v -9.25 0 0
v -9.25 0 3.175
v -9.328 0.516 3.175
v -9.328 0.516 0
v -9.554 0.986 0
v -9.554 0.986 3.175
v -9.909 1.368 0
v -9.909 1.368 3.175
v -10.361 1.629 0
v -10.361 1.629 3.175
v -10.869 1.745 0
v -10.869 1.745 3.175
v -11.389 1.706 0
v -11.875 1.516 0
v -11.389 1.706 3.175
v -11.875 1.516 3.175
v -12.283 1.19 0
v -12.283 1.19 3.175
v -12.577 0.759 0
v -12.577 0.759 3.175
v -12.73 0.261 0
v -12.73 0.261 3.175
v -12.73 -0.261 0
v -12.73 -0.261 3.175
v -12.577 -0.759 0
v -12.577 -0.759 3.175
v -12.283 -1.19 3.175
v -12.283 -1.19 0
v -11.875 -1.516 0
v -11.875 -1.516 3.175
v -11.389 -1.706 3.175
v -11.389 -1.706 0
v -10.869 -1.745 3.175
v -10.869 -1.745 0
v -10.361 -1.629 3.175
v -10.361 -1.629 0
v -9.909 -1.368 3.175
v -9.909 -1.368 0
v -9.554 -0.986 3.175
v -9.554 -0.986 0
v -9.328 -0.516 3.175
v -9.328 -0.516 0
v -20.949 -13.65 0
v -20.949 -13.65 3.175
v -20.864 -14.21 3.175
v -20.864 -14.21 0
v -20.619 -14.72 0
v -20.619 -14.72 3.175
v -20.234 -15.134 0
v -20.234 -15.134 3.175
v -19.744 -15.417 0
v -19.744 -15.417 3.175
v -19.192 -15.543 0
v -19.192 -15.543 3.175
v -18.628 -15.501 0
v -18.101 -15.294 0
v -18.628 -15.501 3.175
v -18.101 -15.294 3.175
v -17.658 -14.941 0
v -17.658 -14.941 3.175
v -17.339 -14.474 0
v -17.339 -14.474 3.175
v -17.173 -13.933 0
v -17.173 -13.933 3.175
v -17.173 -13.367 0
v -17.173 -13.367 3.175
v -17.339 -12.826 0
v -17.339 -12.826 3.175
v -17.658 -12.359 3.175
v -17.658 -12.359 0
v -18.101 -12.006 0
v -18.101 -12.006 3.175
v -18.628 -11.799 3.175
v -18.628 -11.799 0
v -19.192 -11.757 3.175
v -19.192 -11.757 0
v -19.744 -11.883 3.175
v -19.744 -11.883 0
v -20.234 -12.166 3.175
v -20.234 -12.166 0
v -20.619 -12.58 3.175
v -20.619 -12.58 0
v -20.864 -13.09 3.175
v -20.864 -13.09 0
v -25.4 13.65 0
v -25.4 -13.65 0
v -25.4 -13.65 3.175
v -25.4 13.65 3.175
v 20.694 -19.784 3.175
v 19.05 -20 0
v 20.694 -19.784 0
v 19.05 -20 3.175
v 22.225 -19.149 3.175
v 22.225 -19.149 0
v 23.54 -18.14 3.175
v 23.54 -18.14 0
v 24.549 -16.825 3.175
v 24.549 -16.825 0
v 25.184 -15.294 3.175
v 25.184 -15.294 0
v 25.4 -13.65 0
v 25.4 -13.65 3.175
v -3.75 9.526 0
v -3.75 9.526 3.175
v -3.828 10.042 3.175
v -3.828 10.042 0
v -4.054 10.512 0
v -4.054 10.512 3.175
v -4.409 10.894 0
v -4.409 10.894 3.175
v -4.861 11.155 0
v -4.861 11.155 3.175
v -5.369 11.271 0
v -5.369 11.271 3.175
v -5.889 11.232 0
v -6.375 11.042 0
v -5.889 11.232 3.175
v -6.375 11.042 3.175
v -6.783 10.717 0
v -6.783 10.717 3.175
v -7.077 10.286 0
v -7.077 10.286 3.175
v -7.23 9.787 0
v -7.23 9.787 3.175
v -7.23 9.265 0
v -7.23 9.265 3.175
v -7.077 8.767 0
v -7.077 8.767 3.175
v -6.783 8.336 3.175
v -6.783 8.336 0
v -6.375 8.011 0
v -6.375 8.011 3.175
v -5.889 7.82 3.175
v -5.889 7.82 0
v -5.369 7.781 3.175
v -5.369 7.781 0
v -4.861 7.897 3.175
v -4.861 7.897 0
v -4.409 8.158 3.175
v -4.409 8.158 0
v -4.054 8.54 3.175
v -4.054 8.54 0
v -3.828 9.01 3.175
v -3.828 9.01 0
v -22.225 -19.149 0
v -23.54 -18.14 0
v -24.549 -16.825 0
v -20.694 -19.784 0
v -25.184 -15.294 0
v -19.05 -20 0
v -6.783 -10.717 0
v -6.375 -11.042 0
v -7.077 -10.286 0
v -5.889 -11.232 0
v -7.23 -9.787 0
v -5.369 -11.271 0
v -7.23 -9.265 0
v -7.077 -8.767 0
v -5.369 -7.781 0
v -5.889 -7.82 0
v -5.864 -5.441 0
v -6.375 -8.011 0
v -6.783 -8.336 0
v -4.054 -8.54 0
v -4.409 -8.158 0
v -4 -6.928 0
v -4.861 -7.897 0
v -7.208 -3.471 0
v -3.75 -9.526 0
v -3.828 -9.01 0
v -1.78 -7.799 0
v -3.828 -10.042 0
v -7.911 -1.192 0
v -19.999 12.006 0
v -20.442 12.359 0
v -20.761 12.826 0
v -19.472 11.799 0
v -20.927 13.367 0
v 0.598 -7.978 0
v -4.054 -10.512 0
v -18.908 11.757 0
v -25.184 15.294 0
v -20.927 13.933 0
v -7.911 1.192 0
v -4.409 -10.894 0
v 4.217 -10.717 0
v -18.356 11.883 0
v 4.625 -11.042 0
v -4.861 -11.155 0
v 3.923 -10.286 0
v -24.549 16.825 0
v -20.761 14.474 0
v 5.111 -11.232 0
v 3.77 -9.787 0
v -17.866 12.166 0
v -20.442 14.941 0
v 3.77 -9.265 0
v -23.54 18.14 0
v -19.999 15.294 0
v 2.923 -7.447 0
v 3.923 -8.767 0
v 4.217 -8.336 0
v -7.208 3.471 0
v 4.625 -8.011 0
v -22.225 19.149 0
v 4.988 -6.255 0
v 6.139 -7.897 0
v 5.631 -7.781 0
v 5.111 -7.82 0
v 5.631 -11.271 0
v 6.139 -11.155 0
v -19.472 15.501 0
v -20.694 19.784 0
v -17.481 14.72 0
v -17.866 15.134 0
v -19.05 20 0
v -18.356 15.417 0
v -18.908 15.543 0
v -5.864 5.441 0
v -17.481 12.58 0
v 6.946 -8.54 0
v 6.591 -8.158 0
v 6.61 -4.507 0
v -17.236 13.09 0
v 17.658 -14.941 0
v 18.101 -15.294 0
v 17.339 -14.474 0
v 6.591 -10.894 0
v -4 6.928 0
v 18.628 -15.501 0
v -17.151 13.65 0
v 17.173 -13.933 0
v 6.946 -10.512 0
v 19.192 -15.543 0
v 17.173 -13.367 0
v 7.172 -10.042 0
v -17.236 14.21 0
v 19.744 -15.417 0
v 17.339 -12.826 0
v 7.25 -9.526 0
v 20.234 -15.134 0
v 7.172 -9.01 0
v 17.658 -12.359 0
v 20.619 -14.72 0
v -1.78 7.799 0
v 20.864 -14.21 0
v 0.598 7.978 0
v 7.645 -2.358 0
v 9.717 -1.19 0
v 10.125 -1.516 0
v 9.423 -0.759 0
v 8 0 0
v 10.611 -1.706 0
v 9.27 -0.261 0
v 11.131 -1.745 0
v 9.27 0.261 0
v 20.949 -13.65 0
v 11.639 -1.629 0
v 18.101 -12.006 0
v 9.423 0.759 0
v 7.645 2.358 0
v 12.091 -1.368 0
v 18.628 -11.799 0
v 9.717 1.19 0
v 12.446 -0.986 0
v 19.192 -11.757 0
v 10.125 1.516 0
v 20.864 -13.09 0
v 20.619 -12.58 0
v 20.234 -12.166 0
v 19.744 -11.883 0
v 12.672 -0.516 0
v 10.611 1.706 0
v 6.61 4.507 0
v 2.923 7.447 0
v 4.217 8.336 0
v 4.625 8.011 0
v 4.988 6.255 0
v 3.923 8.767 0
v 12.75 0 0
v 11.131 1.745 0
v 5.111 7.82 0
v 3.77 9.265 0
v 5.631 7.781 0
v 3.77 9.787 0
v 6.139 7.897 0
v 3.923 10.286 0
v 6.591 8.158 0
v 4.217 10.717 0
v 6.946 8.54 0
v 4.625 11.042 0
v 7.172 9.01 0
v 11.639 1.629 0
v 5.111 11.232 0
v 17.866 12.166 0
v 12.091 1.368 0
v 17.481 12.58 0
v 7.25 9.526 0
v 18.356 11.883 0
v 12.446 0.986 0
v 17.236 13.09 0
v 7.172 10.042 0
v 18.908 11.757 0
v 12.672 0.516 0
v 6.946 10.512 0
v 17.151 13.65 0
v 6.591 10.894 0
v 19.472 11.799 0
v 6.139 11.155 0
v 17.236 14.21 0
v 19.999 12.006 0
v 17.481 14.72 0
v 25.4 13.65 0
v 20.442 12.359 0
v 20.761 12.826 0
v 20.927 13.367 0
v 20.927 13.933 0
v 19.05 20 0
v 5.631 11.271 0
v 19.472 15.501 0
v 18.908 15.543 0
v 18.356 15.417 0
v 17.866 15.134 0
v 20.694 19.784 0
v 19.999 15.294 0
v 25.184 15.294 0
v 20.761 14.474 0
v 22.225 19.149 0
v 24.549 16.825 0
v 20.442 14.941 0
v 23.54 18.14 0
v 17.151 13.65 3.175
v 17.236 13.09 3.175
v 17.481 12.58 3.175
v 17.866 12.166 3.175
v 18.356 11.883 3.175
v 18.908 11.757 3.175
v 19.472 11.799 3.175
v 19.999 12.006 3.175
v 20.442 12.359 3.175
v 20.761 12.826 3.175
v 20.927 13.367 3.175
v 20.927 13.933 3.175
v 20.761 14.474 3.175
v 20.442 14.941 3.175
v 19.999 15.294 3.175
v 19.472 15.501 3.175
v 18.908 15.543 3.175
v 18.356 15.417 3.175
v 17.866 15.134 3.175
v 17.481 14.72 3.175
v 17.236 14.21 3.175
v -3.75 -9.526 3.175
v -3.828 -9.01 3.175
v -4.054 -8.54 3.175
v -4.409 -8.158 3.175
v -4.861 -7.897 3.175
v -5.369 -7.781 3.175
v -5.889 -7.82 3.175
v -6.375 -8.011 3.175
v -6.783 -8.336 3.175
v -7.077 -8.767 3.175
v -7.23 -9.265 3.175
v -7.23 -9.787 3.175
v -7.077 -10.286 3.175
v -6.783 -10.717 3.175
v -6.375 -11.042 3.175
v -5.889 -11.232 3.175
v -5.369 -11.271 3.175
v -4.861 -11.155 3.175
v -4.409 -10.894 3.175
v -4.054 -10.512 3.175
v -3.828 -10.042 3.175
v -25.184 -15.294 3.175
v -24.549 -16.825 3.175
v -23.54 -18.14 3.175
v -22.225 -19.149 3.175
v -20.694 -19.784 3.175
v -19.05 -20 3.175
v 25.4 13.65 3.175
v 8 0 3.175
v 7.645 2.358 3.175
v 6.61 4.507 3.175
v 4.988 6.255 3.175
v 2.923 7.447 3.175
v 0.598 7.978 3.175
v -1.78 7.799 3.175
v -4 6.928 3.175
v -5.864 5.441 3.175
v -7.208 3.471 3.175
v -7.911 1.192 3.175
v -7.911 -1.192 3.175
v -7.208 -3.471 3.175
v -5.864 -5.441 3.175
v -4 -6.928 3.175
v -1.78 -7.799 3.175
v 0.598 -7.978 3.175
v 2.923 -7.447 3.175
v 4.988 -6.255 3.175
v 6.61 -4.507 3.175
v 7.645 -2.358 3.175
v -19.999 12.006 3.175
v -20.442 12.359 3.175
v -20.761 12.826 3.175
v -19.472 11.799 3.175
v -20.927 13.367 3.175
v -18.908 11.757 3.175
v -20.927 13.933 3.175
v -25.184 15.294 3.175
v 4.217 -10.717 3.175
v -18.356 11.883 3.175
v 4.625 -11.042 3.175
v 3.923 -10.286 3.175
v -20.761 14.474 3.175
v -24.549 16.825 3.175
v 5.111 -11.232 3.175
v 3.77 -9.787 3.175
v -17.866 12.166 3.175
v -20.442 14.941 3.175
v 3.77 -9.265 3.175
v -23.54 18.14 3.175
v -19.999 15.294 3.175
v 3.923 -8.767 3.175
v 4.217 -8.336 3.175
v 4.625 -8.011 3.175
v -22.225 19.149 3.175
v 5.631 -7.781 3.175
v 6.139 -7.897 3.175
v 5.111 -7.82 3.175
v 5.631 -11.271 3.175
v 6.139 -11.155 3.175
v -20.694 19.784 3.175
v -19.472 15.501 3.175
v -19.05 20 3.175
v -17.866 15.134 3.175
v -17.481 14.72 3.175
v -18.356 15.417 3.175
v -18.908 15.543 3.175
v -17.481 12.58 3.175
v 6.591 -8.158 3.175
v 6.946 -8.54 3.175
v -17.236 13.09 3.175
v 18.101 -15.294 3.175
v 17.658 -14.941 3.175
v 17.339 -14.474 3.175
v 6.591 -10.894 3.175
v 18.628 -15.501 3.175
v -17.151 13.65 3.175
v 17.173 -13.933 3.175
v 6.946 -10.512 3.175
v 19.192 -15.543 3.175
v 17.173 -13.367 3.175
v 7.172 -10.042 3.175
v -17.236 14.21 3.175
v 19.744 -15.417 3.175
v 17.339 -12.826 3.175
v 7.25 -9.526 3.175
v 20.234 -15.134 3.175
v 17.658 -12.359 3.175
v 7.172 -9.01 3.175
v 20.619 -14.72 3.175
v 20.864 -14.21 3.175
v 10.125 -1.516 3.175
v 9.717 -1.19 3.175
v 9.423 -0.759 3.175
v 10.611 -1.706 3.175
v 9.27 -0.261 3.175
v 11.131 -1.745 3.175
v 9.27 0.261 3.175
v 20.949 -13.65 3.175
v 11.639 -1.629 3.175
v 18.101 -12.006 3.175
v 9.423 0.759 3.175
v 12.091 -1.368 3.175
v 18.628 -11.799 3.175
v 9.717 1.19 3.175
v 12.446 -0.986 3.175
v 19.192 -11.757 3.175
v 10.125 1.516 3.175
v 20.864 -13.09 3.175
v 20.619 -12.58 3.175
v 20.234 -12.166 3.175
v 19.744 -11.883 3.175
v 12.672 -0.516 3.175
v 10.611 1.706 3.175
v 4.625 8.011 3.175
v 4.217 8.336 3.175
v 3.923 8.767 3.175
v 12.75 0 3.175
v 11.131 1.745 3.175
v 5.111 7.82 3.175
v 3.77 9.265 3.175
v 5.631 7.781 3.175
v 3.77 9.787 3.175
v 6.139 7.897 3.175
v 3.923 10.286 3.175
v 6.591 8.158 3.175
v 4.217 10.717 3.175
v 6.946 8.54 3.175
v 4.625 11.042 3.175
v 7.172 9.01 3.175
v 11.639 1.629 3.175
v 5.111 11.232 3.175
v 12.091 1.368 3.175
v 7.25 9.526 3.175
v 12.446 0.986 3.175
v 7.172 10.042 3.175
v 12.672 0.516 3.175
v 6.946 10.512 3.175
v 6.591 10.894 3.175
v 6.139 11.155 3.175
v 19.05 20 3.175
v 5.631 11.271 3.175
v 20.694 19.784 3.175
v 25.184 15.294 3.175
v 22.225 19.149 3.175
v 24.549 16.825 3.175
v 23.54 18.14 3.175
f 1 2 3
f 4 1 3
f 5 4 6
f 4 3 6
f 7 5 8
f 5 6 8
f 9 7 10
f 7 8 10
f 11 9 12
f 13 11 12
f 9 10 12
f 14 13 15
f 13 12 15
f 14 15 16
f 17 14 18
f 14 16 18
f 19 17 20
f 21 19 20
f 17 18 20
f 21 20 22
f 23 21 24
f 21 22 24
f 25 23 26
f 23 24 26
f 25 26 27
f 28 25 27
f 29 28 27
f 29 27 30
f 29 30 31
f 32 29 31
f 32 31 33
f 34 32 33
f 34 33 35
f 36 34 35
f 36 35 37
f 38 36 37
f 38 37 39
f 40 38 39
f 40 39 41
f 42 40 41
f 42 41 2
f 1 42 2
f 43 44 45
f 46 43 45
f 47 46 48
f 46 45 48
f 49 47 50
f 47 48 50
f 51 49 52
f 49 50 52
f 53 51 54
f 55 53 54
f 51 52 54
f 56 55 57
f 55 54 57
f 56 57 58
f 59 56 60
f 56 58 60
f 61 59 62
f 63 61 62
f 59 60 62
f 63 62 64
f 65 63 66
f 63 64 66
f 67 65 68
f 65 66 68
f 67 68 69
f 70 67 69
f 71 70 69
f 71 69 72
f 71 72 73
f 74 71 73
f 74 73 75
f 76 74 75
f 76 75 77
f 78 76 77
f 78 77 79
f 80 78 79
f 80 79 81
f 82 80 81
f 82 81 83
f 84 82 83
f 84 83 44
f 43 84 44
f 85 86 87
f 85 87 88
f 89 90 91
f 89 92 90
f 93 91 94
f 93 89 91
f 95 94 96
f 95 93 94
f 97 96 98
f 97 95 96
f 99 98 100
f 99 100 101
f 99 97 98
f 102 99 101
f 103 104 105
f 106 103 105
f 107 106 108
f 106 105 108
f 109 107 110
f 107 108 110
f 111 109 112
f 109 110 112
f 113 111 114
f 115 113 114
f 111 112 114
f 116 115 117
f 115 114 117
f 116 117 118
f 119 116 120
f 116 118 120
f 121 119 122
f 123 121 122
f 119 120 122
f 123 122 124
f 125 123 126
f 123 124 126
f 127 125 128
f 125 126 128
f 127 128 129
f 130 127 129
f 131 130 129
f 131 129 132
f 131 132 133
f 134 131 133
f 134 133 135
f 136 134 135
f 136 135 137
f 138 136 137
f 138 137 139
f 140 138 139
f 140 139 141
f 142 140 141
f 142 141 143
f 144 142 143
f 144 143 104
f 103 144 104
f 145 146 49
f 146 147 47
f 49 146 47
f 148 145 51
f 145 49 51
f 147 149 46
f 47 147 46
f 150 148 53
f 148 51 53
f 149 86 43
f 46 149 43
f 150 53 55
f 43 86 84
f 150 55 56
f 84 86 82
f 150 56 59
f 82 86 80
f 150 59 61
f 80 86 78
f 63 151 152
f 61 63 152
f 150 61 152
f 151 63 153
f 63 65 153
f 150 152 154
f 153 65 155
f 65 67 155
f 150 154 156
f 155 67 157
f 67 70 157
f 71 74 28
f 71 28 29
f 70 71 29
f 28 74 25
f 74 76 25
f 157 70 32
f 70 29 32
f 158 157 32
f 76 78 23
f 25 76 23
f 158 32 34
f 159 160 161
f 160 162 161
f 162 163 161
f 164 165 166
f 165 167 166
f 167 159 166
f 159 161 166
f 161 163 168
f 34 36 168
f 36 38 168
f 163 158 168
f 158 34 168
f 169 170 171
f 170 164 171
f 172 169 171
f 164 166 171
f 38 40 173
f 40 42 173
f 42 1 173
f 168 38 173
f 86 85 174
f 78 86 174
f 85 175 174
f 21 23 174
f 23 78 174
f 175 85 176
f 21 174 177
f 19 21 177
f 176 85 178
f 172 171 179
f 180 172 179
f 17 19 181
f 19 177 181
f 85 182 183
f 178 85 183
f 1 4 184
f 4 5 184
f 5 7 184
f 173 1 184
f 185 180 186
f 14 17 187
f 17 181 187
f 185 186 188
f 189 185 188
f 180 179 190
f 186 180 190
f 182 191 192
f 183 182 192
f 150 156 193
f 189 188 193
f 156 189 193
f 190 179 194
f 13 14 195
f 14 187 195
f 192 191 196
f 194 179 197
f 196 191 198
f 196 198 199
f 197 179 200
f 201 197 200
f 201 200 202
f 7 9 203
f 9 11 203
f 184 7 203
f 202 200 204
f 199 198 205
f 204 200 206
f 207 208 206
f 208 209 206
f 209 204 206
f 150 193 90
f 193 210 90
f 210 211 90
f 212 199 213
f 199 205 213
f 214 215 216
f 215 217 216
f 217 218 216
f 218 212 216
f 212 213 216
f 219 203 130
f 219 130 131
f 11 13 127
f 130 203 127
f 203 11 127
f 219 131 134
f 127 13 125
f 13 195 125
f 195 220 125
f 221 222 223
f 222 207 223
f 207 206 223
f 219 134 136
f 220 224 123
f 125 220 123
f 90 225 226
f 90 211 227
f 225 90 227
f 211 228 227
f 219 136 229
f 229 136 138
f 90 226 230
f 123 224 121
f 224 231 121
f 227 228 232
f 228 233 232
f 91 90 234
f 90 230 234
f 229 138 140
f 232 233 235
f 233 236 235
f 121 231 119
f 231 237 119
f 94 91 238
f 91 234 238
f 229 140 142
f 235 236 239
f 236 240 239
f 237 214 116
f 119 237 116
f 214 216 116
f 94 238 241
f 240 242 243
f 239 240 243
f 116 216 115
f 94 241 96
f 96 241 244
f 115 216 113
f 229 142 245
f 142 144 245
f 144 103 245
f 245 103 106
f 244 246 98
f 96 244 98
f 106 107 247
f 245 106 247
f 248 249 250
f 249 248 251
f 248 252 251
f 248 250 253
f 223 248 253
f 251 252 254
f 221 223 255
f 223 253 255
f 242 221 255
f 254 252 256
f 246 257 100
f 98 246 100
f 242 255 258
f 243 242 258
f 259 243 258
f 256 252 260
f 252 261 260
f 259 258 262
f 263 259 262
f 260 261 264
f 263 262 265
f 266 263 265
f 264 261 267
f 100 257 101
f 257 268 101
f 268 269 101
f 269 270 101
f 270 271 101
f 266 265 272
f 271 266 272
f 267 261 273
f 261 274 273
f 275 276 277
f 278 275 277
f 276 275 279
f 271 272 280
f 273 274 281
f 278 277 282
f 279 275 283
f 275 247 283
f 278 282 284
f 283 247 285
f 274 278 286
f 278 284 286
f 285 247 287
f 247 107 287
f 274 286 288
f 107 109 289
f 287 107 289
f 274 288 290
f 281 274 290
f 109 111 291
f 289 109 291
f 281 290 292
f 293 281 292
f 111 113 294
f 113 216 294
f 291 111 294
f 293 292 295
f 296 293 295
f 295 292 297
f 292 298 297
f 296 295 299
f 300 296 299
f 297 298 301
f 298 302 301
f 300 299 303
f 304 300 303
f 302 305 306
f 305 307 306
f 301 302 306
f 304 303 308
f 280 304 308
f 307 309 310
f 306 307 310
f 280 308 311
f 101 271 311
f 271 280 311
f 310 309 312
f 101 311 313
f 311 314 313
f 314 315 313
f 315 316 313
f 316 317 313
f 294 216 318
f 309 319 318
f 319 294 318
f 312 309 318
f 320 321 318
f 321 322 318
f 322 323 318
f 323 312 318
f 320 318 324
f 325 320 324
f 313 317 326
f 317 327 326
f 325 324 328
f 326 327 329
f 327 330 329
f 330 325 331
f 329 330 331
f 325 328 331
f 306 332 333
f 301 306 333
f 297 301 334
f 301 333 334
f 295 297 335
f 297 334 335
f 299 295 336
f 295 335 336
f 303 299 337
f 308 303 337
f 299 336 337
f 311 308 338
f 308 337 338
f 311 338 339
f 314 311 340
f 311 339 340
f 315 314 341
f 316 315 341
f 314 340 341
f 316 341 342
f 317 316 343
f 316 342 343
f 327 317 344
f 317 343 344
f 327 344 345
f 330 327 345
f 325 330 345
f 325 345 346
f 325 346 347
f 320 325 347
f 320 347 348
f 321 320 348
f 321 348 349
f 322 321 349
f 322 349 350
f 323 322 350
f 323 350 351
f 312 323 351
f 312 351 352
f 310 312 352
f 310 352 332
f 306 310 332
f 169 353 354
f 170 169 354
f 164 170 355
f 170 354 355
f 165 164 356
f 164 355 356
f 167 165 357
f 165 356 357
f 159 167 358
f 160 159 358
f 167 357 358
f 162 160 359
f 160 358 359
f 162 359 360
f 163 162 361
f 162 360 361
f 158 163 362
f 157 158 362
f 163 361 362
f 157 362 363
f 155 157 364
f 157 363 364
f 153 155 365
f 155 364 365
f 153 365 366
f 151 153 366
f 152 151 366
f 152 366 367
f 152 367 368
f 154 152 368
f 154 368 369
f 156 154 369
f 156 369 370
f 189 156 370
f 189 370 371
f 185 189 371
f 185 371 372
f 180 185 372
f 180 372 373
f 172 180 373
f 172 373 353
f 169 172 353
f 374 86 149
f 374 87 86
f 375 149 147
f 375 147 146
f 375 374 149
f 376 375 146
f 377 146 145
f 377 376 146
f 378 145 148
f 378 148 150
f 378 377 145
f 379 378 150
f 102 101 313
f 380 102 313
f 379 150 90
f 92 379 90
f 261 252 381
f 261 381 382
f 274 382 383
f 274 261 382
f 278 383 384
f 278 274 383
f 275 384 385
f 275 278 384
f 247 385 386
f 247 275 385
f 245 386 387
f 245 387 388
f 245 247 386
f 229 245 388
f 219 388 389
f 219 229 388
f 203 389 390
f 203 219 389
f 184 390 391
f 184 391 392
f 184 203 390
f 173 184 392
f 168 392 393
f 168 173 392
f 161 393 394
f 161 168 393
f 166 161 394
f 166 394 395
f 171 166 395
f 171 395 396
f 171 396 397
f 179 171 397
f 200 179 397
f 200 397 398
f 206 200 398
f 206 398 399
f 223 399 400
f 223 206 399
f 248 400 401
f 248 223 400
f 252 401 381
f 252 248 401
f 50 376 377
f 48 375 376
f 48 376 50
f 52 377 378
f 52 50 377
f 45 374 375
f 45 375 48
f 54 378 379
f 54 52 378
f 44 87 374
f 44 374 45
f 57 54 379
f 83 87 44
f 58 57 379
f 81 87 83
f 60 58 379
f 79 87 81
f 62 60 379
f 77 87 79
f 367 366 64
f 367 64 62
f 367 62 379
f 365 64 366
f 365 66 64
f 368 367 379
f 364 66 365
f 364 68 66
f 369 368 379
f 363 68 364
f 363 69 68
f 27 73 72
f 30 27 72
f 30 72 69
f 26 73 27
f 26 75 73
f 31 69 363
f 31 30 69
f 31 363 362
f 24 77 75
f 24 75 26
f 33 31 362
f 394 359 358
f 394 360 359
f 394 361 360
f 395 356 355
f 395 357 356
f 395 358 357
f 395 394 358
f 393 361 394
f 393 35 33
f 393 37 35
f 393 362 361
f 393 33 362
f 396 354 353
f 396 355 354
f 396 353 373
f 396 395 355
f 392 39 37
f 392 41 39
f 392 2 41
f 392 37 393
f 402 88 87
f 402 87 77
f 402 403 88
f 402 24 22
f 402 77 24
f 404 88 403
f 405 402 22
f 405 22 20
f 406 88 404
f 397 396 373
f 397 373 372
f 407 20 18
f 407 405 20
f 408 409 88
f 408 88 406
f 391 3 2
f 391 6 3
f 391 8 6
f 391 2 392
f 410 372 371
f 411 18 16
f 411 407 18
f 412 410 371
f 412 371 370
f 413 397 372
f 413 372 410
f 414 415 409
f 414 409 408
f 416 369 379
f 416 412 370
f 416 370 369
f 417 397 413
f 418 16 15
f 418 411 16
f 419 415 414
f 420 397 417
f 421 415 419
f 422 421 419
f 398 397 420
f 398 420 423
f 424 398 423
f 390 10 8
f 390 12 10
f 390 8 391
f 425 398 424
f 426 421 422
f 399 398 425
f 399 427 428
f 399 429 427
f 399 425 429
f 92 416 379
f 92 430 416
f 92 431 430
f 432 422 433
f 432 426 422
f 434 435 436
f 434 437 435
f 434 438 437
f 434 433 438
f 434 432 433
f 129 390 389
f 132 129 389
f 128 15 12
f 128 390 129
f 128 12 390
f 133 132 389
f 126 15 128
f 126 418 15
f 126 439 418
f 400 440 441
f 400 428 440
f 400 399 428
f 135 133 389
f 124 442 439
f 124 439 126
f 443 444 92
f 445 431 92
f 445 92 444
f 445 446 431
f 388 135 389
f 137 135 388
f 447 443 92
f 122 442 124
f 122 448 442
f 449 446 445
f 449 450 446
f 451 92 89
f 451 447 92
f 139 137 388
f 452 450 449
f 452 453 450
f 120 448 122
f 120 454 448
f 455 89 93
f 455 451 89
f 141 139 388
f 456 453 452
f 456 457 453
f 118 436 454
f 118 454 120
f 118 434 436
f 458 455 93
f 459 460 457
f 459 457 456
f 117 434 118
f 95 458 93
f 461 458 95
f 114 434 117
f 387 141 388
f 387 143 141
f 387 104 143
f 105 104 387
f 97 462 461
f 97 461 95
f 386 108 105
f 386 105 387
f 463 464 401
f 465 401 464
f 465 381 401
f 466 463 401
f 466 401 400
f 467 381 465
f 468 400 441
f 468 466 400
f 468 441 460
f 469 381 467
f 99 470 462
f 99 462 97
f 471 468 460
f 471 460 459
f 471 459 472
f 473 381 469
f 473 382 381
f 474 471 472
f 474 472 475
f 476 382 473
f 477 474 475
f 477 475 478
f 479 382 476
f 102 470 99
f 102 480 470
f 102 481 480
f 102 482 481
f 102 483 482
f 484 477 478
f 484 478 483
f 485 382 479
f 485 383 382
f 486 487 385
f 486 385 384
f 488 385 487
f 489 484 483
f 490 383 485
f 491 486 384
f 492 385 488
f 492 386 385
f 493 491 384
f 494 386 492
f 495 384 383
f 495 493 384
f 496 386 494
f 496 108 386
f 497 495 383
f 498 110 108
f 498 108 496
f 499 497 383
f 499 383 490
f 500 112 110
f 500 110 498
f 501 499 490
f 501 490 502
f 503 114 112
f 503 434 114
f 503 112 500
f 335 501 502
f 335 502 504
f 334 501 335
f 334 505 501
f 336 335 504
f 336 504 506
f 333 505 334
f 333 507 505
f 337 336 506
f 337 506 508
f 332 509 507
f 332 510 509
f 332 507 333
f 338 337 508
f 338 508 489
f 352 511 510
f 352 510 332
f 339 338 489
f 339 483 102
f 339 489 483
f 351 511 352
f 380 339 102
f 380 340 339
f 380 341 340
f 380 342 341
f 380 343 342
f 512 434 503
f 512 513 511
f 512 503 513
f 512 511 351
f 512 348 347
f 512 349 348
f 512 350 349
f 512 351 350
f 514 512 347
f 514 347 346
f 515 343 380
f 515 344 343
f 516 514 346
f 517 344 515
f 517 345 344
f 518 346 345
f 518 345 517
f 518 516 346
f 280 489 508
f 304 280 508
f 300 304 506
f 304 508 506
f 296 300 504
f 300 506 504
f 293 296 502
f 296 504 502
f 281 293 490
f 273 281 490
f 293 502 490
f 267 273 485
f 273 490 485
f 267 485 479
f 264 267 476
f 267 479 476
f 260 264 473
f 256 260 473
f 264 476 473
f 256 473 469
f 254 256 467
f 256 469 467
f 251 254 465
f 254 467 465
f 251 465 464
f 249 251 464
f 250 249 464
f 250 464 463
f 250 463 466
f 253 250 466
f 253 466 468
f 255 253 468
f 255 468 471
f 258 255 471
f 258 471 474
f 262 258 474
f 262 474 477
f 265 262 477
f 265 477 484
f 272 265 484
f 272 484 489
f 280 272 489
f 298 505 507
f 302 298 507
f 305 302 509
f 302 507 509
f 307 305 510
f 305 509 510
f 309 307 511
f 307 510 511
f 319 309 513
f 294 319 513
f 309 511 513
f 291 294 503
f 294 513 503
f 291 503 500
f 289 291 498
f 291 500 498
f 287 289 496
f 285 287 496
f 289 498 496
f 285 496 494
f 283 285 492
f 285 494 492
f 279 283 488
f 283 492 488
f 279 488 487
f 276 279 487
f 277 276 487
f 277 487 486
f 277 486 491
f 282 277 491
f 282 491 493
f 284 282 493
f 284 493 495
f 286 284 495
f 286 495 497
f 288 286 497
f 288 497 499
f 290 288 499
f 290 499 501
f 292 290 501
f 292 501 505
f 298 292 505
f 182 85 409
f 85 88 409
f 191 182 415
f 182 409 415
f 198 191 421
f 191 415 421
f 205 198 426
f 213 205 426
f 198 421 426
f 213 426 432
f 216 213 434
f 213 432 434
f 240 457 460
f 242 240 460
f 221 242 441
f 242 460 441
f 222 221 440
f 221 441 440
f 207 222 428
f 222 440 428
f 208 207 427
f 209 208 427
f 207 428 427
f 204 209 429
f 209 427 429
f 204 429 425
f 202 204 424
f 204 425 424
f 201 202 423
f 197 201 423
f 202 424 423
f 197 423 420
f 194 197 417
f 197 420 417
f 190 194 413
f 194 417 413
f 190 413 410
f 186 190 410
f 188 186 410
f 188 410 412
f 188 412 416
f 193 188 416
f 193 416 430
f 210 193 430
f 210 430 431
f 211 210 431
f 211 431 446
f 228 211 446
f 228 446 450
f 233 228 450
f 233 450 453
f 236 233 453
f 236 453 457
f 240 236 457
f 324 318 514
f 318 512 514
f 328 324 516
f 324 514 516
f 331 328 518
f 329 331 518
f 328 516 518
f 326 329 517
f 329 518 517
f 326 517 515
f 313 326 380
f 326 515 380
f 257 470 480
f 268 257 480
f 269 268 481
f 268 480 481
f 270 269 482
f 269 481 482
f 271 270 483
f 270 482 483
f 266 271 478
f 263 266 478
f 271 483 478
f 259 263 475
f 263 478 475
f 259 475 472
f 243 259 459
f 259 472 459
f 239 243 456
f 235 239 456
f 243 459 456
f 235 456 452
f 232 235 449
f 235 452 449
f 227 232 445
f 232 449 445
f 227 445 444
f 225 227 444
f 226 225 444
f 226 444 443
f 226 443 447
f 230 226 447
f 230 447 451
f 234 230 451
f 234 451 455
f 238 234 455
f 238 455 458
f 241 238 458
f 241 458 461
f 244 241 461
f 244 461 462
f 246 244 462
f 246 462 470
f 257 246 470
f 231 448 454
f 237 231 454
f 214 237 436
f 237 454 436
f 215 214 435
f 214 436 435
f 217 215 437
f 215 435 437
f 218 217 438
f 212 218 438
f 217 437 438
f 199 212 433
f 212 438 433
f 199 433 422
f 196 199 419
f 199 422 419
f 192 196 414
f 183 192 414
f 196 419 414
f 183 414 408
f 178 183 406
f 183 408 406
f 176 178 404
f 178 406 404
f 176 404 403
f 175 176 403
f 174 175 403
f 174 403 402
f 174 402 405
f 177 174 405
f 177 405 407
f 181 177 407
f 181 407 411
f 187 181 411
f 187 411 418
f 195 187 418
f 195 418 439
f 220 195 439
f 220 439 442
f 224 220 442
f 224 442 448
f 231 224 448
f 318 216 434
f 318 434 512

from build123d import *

# Parameters (mm, degrees)
SKETCH1_W           = 50.8
SKETCH1_H           = 40
SKETCH1_R           = 8
BOSS_EXTRUDE1_DEPTH = 3.175
FILLET1_R           = 6.35
SKETCH9_R           = 1.75
M3_THROUGH_DEPTH    = 33.484467442
SKETCH10_R          = 1.89865
CUT_EXTRUDE2_DEPTH  = 33.484467442


with BuildPart() as part:
    # Sketch1 → Boss-Extrude1 (new body)
    with BuildSketch(Plane.XY):
        Rectangle(SKETCH1_W, SKETCH1_H)
        Circle(SKETCH1_R, mode=Mode.SUBTRACT)
    extrude(amount=BOSS_EXTRUDE1_DEPTH)

    # Fillet1
    fillet1_edges = [part.edges().sort_by_distance(p)[0] for p in [
        (-25.4, 20, 1.5875),
        (25.4, 20, 1.5875),
        (25.4, -20, 1.5875),
        (-25.4, -20, 1.5875),
    ]]
    fillet(fillet1_edges, radius=FILLET1_R)

    # Sketch9 → M3-through (cut, through all)
    with BuildSketch(Plane.XY.offset(3.175)):
        with Locations((11, 0)):
            Circle(SKETCH9_R)
        with Locations((5.5, -9.526279442)):
            Circle(SKETCH9_R)
        with Locations((-5.5, -9.526279442)):
            Circle(SKETCH9_R)
        with Locations((-11, 0)):
            Circle(SKETCH9_R)
        with Locations((-5.5, 9.526279442)):
            Circle(SKETCH9_R)
        with Locations((5.5, 9.526279442)):
            Circle(SKETCH9_R)
    extrude(amount=-M3_THROUGH_DEPTH, mode=Mode.SUBTRACT)

    # Sketch10 → Cut-Extrude2 (cut, through all)
    with BuildSketch(Plane.XY.offset(3.175)):
        with Locations((19.05, -13.65)):
            Circle(SKETCH10_R)
        with Locations(Location((19.05, 13.65, 0), (0, 0, 180))):
            Circle(SKETCH10_R)
        with Locations(Location((-19.05, -13.65, 0), (0, 0, 180))):
            Circle(SKETCH10_R)
        with Locations((-19.05, 13.65)):
            Circle(SKETCH10_R)
    extrude(amount=-CUT_EXTRUDE2_DEPTH, mode=Mode.SUBTRACT)


solid = part.part
